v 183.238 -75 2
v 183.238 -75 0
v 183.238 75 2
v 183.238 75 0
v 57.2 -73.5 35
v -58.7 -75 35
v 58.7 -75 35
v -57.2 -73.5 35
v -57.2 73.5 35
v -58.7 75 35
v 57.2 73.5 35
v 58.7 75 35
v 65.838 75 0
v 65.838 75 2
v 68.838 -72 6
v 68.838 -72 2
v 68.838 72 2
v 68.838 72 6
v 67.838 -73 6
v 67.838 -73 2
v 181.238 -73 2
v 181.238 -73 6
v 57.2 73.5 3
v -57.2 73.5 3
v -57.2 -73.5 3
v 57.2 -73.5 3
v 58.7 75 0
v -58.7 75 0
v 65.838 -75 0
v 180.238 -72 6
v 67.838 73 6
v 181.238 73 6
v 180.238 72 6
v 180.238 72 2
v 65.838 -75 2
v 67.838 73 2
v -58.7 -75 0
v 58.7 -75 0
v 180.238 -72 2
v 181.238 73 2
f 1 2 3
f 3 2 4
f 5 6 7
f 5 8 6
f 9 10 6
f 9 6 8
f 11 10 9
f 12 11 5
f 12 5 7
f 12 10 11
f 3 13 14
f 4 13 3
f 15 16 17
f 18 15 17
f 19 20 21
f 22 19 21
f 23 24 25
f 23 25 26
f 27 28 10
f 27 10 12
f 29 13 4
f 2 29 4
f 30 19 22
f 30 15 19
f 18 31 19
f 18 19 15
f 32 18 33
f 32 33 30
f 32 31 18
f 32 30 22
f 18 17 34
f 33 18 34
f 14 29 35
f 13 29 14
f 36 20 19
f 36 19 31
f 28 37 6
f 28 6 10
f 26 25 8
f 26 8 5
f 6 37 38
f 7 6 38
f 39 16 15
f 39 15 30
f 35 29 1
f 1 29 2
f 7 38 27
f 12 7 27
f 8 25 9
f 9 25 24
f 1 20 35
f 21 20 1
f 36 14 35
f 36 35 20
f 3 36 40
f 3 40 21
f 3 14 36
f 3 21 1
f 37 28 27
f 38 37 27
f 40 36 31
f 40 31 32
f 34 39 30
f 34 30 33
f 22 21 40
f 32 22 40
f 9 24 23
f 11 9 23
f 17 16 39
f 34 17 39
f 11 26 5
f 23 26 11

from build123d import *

# Parameters (mm, degrees)
F0_W     = 117.4
F0_H     = 150
F0_W_2   = 114.4
F0_H_2   = 147
F1_DEPTH = 35
F2_W     = 117.4
F2_H     = 150
F3_DEPTH = 3
F4_W     = 113.4
F4_H     = 146
F4_W_2   = 111.4
F4_H_2   = 144
F5_DEPTH = 6
F4_W_3   = 117.4
F4_H_3   = 150
F6_DEPTH = 2


with BuildPart() as f1:
    # F0 (on Top) → F1 (new body)
    with BuildSketch(Plane.XY):
        Rectangle(F0_W, F0_H)
        Rectangle(F0_W_2, F0_H_2, mode=Mode.SUBTRACT)
    extrude(amount=F1_DEPTH)

    # F2 (on Top) → F3 (join)
    with BuildSketch(Plane.XY):
        Rectangle(F2_W, F2_H)
    extrude(amount=F3_DEPTH)


with BuildPart() as f5:
    # F4 (on Top) → F5 (new body)
    with BuildSketch(Plane.XY):
        with Locations((124.538116, 0)):
            Rectangle(F4_W, F4_H)
        with Locations((124.538116, 0)):
            Rectangle(F4_W_2, F4_H_2, mode=Mode.SUBTRACT)
    extrude(amount=F5_DEPTH)

    # F4 (on Top) → F6 (join)
    with BuildSketch(Plane.XY):
        with Locations((124.538116, 0)):
            Rectangle(F4_W_3, F4_H_3)
        with Locations((124.538116, 0)):
            Rectangle(F4_W, F4_H, mode=Mode.SUBTRACT)
        with Locations((124.538116, 0)):
            Rectangle(F4_W_2, F4_H_2)
    extrude(amount=F6_DEPTH)


solid = Compound([f1.part, f5.part])
